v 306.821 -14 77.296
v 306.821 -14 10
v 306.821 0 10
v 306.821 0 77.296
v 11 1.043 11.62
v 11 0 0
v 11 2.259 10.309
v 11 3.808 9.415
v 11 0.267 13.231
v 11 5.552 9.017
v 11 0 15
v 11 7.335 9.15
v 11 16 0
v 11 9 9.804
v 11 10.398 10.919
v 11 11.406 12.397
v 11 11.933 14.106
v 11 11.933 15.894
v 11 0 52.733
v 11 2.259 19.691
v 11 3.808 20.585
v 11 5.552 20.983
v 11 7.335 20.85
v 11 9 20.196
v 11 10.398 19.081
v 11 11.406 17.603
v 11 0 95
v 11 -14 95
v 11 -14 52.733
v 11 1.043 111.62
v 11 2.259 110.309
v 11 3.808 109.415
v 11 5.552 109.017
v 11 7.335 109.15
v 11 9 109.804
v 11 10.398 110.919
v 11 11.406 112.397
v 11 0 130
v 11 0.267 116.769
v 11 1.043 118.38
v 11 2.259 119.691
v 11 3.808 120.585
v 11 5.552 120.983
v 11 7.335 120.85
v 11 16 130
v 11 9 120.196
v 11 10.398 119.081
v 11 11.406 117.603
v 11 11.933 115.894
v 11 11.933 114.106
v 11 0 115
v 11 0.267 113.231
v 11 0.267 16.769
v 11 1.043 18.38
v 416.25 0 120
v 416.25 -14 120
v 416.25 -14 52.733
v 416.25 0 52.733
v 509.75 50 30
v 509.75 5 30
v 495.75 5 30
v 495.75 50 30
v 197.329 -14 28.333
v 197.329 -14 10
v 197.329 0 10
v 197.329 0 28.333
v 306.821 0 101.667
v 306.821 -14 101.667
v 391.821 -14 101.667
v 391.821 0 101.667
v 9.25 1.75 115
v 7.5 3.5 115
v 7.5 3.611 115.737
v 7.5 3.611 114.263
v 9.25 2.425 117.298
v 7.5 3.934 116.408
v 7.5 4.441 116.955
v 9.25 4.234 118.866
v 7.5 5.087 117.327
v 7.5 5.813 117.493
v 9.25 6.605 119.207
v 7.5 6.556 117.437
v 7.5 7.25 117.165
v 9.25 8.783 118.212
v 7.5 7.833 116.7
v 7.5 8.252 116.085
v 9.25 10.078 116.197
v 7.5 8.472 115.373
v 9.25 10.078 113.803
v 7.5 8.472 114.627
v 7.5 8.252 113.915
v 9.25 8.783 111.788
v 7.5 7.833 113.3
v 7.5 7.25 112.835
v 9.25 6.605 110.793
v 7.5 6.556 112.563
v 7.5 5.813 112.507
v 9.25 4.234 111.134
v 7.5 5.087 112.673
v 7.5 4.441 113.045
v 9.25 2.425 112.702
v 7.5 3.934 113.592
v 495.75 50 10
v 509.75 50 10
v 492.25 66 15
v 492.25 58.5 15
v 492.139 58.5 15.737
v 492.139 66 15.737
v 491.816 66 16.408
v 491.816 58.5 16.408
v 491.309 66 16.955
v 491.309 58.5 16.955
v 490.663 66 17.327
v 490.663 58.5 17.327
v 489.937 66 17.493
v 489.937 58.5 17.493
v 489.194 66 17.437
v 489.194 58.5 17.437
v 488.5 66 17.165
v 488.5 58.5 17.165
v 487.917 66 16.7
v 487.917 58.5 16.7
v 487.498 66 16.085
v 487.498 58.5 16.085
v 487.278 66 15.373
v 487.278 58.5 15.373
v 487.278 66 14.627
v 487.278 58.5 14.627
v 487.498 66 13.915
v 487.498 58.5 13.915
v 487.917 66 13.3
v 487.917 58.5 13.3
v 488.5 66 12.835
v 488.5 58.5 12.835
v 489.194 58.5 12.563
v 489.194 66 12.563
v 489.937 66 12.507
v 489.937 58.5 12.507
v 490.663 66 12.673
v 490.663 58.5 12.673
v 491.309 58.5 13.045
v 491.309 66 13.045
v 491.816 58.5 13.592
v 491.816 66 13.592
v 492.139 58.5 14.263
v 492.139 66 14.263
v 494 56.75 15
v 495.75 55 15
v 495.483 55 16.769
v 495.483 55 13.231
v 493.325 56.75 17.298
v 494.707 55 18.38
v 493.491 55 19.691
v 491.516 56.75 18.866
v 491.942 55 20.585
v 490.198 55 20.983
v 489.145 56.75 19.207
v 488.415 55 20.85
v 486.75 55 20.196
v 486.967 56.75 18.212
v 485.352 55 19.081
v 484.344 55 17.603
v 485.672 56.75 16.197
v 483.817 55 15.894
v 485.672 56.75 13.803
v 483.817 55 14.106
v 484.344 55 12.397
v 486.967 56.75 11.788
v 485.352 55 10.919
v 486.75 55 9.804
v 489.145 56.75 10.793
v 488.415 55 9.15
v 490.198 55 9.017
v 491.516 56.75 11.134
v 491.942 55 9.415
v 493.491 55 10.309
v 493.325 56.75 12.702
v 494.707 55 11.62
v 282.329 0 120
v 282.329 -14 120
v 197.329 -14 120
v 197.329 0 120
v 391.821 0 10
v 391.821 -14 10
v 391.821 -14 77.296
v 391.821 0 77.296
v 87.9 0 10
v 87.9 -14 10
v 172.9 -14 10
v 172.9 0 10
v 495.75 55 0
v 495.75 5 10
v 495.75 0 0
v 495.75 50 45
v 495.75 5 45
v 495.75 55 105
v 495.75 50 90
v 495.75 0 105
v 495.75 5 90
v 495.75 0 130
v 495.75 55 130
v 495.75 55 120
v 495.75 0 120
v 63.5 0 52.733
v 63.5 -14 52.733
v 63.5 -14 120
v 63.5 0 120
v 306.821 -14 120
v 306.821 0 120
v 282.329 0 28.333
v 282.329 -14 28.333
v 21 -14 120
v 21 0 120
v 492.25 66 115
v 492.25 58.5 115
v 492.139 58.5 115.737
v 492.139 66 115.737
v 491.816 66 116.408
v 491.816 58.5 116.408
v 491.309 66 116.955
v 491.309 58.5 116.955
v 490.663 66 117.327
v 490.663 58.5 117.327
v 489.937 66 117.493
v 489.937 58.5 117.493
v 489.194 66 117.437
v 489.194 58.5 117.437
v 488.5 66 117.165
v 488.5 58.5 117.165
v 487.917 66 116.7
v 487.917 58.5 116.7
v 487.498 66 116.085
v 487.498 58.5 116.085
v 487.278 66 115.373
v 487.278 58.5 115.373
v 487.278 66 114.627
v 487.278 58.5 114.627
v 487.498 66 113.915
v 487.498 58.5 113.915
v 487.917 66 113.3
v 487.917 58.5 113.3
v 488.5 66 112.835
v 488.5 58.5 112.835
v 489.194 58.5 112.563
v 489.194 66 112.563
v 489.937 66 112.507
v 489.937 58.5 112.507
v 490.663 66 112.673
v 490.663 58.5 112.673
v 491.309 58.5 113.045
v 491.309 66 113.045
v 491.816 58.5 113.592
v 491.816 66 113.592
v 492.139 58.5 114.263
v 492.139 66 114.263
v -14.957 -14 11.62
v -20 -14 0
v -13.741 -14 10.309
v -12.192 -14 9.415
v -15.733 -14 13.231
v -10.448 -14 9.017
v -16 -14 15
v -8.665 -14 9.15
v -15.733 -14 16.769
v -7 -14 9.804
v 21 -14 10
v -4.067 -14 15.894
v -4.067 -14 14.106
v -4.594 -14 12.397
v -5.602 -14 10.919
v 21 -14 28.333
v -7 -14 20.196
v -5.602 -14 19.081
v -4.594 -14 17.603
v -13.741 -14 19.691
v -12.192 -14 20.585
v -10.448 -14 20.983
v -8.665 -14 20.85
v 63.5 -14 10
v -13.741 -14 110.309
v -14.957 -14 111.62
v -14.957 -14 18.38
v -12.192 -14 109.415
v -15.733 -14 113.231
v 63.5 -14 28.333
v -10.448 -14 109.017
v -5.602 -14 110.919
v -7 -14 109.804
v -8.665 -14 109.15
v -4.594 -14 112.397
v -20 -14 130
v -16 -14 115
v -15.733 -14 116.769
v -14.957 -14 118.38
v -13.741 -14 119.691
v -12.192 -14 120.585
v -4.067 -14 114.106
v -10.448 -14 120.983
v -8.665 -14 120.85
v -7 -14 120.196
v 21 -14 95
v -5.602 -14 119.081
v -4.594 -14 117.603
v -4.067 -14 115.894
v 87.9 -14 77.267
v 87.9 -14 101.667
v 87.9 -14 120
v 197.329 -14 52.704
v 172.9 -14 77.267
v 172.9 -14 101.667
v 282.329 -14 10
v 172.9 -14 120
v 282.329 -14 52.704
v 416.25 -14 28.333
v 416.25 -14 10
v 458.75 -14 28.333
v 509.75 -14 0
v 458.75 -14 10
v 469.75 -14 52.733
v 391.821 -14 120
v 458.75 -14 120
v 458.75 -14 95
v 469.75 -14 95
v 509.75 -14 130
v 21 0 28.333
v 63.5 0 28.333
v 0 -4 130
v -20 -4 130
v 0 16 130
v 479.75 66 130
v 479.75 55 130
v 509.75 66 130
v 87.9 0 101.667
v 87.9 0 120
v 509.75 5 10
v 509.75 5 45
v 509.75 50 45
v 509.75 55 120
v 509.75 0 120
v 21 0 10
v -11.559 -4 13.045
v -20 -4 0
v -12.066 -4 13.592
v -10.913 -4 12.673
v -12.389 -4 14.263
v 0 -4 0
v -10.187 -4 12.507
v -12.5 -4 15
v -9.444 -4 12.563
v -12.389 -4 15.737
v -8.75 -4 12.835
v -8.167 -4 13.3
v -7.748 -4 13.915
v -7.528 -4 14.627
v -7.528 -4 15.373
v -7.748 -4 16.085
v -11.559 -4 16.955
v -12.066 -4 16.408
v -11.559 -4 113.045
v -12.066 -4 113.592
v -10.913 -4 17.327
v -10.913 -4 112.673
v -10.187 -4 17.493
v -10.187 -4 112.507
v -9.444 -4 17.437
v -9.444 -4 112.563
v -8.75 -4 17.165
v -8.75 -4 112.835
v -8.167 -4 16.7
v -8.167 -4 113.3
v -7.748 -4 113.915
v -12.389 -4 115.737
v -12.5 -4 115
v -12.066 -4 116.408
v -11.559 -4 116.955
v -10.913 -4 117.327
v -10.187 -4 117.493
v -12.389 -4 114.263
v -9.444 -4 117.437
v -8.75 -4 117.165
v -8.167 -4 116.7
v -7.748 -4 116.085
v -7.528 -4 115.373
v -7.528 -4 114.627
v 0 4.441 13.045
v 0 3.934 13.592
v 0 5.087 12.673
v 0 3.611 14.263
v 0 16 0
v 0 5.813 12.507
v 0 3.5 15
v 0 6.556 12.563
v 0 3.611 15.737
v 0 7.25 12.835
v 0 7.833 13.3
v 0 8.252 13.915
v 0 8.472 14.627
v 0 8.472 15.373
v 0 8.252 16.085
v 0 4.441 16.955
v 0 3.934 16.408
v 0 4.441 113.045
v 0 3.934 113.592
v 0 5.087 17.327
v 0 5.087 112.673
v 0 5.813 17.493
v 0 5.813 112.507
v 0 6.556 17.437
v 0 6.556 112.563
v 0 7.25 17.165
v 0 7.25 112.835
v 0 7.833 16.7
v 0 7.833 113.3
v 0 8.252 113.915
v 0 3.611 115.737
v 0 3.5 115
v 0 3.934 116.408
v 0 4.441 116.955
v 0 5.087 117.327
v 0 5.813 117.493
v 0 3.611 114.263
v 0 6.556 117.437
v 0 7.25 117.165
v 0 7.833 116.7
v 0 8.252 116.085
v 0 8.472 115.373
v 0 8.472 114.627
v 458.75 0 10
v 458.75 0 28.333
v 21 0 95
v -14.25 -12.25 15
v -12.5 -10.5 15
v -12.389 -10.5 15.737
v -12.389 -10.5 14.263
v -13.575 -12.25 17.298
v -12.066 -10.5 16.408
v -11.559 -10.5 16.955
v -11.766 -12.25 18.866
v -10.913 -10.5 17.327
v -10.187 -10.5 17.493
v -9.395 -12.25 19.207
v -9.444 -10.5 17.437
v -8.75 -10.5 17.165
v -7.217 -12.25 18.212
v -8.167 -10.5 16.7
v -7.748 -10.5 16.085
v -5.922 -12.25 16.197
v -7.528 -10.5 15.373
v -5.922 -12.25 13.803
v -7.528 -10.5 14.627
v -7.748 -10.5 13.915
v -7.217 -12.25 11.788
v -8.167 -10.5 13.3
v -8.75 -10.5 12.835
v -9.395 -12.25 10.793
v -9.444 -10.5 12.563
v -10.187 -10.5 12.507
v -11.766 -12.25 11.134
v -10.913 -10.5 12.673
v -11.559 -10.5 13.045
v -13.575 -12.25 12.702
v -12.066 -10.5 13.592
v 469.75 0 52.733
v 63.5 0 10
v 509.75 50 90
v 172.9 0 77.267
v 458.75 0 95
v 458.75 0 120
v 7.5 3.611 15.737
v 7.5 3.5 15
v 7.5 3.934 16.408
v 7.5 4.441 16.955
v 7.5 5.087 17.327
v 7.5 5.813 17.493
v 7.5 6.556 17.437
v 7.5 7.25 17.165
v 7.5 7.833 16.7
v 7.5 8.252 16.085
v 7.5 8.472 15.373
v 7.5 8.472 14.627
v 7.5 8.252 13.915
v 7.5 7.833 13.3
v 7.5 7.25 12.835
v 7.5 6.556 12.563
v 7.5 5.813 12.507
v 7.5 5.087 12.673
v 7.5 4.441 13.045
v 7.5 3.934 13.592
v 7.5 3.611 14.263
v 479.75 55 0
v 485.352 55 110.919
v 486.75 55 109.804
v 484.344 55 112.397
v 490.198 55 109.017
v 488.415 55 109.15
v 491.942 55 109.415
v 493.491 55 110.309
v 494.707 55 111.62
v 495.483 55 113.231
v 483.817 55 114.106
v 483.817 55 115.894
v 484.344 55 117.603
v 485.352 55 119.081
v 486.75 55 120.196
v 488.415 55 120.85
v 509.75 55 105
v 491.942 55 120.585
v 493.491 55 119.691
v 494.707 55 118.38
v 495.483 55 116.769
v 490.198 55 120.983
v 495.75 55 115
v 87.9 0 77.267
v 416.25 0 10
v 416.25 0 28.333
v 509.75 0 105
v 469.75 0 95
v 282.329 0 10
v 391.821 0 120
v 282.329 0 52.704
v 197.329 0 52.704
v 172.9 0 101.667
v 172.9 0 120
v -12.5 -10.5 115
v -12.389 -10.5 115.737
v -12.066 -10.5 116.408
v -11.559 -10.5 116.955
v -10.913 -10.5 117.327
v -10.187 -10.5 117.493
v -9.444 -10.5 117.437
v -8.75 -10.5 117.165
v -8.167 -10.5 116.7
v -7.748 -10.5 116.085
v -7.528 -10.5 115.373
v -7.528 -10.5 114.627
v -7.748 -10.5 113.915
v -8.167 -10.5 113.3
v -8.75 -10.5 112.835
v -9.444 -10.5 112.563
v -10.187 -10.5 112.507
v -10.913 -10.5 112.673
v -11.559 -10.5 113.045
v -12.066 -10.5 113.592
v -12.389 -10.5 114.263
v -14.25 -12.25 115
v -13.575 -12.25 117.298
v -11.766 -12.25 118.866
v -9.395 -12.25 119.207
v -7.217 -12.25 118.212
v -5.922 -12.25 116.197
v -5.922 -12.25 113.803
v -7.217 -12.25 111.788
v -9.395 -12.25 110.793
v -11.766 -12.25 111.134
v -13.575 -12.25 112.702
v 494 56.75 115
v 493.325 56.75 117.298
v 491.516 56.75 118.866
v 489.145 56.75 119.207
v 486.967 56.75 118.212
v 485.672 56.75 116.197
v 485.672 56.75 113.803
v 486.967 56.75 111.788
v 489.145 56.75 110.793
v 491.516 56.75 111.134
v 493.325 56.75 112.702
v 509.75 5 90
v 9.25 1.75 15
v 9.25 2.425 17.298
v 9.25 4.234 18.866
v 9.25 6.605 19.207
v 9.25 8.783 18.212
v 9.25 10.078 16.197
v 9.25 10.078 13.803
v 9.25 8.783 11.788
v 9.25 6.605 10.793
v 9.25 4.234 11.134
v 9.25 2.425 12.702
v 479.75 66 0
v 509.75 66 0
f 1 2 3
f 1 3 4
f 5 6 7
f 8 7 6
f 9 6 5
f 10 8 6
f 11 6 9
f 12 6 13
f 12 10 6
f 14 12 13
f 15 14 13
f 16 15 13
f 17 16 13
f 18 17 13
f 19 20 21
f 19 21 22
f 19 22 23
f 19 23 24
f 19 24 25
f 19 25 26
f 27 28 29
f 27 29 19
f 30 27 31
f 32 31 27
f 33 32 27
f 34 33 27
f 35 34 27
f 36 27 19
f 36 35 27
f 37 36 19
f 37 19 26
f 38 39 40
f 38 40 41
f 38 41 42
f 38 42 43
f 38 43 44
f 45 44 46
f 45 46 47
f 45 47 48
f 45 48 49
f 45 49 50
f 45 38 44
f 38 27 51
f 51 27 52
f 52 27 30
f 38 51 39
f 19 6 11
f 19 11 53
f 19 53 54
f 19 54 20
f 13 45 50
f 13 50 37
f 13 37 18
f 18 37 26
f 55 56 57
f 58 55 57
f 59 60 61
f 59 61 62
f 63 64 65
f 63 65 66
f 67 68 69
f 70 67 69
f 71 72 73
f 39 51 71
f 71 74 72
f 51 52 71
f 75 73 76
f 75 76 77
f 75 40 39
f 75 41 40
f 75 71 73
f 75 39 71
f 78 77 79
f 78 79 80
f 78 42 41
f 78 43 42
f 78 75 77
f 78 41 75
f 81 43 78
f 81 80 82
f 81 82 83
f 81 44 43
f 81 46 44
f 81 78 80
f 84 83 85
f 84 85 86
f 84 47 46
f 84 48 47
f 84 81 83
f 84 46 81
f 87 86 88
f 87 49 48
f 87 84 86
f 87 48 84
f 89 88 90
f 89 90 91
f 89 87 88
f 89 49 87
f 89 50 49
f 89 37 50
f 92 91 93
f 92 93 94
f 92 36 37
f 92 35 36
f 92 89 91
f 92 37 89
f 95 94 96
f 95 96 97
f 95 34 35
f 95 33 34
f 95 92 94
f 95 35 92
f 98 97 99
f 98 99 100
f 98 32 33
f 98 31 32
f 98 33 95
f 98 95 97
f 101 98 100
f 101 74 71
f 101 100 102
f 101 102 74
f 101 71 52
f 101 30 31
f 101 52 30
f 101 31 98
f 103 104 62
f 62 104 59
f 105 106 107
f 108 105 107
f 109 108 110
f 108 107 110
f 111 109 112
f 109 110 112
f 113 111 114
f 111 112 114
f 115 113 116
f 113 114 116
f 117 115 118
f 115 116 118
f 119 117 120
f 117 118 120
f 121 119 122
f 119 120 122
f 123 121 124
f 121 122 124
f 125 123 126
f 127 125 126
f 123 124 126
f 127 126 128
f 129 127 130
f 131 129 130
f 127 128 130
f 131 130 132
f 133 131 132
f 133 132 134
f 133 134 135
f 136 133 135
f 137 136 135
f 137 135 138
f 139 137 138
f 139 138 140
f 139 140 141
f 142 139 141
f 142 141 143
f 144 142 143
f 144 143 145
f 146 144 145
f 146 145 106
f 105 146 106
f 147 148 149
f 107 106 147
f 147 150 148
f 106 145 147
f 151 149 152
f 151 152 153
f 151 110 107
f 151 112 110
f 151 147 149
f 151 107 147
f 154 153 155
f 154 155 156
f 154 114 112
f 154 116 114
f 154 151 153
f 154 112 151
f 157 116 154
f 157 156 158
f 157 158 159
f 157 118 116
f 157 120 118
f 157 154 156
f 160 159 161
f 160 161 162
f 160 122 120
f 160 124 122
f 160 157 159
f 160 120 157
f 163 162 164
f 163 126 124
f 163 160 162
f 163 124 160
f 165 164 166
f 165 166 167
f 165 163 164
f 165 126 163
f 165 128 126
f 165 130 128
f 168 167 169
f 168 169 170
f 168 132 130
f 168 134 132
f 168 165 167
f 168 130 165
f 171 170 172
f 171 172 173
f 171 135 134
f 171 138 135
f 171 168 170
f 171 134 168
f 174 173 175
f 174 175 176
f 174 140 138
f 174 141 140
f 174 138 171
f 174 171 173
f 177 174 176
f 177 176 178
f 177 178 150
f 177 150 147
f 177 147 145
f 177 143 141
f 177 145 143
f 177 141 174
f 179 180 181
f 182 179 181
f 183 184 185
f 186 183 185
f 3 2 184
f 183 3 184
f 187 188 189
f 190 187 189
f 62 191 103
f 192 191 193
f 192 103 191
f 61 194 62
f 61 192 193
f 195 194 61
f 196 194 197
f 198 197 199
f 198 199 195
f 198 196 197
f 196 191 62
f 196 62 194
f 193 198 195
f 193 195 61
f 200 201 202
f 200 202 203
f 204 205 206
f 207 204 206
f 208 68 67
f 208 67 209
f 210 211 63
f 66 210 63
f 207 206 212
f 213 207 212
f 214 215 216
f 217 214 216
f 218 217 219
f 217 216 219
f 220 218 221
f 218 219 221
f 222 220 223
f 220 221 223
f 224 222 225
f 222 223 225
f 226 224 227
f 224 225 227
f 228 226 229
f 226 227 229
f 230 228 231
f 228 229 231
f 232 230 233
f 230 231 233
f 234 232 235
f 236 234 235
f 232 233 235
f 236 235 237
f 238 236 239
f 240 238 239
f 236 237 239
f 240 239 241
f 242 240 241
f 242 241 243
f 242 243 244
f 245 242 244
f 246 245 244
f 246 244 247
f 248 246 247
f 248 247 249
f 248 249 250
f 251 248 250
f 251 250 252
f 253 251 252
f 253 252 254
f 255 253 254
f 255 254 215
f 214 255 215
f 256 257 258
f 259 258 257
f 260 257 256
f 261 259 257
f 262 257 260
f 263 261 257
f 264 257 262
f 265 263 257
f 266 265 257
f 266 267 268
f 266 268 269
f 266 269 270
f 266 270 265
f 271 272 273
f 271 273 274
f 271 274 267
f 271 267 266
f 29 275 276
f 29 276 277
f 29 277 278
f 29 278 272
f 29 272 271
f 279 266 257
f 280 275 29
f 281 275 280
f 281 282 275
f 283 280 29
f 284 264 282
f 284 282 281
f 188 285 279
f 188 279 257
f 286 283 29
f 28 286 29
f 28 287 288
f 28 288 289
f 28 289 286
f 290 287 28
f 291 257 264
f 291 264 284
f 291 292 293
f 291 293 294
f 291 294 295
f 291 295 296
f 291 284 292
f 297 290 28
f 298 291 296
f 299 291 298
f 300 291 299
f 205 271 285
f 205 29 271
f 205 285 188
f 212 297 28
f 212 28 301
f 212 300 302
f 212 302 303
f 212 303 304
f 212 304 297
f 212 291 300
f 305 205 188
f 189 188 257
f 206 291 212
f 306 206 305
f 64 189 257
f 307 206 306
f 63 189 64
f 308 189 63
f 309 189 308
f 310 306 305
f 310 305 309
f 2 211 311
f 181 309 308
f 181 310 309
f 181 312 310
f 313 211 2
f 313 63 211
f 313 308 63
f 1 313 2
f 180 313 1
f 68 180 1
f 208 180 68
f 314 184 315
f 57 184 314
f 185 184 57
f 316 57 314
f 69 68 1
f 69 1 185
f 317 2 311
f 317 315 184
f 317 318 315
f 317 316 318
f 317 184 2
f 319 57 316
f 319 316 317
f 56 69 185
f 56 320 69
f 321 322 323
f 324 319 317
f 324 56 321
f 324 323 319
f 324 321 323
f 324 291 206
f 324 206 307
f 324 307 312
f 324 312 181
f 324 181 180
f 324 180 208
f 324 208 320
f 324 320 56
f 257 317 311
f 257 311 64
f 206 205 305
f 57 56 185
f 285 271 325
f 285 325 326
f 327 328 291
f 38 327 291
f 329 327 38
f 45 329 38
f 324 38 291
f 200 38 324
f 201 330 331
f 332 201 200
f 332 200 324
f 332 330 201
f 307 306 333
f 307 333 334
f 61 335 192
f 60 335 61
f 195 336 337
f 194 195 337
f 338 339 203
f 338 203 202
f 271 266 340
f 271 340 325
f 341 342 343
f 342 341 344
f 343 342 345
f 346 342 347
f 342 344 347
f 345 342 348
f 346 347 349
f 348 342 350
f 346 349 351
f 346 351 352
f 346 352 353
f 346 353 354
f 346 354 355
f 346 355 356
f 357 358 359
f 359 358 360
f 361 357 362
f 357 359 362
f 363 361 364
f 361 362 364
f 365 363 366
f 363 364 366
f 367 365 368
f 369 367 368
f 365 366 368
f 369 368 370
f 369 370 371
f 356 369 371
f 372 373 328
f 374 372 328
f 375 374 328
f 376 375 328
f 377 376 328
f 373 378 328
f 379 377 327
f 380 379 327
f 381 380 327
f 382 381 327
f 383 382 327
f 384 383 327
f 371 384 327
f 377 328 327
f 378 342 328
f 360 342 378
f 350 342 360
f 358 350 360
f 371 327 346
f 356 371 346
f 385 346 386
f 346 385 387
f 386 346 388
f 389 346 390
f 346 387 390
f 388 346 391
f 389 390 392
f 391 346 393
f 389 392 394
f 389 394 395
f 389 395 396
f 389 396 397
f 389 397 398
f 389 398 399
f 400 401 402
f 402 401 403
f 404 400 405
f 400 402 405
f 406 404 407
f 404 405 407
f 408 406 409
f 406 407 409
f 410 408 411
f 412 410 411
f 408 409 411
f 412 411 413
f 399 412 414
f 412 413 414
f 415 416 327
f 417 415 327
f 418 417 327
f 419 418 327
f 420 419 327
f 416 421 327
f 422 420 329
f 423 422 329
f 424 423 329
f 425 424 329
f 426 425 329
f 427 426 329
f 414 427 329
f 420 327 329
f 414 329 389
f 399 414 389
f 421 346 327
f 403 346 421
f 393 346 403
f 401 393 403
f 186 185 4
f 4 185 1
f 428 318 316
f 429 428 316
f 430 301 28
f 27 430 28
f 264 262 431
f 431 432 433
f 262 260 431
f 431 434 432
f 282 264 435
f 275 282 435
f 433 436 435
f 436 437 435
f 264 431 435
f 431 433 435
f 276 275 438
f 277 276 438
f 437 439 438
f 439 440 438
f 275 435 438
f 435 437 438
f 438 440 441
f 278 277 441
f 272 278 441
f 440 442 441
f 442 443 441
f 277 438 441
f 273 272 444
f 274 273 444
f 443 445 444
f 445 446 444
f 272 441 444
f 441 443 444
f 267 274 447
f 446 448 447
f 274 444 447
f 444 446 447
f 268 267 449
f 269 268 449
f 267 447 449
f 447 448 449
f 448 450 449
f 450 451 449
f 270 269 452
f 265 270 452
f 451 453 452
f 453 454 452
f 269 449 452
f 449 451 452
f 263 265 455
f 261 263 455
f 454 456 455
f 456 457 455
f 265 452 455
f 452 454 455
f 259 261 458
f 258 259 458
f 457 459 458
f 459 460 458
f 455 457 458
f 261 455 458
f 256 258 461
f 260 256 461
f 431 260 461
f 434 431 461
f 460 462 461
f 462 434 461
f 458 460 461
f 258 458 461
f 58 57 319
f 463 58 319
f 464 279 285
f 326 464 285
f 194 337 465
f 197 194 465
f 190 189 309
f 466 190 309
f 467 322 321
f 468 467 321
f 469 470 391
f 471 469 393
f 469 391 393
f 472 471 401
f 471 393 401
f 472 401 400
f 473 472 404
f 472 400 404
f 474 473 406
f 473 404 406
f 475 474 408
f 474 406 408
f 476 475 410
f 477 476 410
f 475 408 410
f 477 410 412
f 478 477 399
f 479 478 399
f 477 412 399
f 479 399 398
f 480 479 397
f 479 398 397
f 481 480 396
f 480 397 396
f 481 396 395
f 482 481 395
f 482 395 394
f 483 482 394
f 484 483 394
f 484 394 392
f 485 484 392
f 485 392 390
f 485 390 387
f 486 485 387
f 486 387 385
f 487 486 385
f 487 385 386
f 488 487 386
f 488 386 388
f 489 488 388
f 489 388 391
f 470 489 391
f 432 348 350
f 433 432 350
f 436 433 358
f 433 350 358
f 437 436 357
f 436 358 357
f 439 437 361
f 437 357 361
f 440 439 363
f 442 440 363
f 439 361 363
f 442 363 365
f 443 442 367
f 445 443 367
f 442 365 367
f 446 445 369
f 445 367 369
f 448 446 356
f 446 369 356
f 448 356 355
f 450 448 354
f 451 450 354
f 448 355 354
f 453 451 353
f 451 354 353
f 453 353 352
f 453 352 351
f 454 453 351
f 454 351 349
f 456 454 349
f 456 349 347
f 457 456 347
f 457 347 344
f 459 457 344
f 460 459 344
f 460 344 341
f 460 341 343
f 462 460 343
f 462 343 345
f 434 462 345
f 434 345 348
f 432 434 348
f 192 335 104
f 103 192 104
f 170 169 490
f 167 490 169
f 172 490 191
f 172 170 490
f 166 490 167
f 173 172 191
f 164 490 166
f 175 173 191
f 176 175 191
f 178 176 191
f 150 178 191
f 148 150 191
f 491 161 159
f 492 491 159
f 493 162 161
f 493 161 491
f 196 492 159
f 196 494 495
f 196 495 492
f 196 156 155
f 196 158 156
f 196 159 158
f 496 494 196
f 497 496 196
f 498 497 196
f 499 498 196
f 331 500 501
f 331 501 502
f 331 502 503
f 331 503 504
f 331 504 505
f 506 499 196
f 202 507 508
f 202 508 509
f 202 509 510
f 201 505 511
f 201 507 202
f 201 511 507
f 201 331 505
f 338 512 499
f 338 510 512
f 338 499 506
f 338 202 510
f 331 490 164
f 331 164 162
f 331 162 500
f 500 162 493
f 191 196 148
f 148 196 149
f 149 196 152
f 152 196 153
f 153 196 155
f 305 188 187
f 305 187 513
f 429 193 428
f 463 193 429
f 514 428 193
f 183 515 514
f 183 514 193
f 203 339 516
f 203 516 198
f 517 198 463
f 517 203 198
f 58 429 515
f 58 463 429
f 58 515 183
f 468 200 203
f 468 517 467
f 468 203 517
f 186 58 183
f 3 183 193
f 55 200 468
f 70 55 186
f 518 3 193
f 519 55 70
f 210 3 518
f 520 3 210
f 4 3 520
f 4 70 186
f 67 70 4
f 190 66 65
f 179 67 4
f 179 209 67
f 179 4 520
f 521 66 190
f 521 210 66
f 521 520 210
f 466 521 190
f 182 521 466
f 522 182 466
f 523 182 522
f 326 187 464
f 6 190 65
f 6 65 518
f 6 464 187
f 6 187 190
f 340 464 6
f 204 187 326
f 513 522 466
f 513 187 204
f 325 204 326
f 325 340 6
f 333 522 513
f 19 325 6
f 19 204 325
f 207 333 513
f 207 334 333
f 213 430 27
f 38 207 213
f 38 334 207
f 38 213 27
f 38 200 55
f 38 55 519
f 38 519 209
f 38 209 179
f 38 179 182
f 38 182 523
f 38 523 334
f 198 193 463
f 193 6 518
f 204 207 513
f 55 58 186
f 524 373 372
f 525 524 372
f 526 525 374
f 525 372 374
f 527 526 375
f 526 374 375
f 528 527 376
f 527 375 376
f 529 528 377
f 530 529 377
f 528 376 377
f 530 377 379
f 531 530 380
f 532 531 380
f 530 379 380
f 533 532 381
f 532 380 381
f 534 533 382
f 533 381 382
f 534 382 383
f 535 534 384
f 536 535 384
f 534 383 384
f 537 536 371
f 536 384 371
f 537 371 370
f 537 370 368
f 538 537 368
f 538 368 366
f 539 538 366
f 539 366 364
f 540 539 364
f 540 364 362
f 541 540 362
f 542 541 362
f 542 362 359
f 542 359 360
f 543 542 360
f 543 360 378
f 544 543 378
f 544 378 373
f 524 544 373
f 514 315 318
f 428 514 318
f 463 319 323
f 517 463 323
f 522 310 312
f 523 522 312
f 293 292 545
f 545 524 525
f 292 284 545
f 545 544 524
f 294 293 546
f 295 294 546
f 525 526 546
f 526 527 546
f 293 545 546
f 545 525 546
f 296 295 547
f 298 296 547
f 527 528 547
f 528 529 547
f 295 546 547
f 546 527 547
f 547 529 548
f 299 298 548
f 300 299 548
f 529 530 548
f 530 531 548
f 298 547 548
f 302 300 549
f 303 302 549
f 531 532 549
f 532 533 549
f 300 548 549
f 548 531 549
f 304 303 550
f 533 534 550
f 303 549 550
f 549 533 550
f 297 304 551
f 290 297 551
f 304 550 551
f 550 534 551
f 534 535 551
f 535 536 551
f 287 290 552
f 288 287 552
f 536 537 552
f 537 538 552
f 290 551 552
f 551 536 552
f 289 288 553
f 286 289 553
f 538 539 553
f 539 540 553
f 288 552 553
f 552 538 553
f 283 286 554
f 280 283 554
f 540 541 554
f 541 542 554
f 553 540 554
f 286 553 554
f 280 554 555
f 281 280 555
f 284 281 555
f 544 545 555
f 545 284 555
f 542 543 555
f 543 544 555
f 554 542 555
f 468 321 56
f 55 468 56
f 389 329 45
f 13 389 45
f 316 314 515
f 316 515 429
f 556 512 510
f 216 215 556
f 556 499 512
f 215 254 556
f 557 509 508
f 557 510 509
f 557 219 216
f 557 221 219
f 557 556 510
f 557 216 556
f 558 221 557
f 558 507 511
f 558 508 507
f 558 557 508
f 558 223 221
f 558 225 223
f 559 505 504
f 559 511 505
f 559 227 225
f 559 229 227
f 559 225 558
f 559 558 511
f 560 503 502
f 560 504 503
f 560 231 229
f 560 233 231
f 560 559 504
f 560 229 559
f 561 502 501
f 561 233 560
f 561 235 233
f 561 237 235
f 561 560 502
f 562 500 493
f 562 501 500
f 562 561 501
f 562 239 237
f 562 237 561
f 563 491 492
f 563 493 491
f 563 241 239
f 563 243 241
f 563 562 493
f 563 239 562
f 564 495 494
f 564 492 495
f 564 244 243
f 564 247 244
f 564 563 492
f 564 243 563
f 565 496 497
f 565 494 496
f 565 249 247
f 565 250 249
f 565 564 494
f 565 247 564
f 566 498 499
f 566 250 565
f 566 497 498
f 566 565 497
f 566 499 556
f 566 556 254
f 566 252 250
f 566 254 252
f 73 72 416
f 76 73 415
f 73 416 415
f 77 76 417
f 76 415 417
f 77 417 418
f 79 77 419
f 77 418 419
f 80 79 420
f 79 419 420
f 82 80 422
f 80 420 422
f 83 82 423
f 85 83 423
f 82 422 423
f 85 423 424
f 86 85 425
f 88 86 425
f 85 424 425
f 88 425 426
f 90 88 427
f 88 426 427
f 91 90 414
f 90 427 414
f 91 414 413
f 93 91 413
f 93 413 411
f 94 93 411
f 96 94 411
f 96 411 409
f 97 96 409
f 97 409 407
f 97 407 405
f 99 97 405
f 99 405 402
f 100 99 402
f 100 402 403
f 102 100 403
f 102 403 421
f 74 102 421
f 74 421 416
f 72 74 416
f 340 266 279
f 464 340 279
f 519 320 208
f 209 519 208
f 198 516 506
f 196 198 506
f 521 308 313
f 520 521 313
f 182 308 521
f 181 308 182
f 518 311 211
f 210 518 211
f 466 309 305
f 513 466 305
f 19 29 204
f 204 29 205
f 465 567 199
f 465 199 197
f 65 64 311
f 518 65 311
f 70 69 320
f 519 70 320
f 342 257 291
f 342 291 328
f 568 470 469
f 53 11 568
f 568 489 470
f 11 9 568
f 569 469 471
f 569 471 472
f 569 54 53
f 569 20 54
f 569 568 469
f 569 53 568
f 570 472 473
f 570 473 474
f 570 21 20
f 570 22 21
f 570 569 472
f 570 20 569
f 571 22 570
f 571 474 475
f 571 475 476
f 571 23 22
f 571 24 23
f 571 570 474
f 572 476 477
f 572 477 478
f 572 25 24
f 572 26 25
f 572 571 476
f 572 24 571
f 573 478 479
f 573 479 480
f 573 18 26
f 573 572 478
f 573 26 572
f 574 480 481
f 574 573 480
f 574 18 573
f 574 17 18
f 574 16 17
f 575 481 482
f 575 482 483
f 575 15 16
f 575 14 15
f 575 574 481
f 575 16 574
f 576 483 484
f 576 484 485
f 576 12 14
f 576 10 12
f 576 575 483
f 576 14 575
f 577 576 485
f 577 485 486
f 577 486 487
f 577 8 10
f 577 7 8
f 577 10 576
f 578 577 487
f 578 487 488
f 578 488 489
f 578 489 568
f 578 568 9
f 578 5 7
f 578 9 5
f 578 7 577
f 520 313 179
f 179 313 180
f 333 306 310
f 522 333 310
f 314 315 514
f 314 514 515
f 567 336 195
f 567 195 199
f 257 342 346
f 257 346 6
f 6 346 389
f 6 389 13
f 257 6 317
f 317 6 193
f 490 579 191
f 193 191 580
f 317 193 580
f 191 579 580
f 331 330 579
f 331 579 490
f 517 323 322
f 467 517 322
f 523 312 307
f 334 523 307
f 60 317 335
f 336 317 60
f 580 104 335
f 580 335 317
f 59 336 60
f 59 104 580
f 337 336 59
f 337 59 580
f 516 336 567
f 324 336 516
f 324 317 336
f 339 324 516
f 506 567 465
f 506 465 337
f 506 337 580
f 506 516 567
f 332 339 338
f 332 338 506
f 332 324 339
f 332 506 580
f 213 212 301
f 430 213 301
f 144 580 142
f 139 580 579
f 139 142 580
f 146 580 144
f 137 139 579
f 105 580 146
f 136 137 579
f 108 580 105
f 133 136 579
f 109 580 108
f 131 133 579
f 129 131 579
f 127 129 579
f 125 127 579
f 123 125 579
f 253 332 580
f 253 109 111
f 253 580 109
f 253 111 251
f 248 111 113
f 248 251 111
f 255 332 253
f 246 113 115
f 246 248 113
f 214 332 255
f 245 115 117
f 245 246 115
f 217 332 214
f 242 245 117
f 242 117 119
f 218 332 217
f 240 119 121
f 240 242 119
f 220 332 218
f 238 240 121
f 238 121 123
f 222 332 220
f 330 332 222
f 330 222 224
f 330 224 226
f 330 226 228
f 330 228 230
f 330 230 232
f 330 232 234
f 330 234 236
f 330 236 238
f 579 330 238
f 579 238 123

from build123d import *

# Parameters (mm, degrees)
F0_W           = 479.75
F0_H           = 130
F1_DEPTH       = 14
F2_W           = 20
F2_H           = 10
F3_DEPTH       = 130
F4_W           = 11
F4_H           = 16
F5_DEPTH       = 130
F6_W           = 42.5000000004
F6_H           = 18.3330895797
F6_W_2         = 42.5
F6_H_2         = 67.2669104207
F6_H_3         = 18.3330895795
F6_W_3         = 42.4708837634
F6_H_4         = 67.2961863439
F6_W_4         = 42.5291162366
F6_H_5         = 67.2961863442
F6_W_5         = 42.4708837635
F7_DEPTH       = 25
F8_R           = 2.5
F9_DEPTH       = 25
F10_R          = 2.5
F11_DEPTH      = 11.001
F11_DEPTH_BACK = 25
F12_R          = 2.5
F13_DEPTH      = 25
F14_SIZE       = 3.49999
F15_W          = 45
F15_H          = 20
F15_W_2        = 55
F15_H_2        = 15
F15_H_3        = 45
F16_DEPTH      = 25


# Not quite as in the source:
# - a fillet or chamfer is up to 0.001 mm smaller than in the source, because OpenCascade refuses the exact size
# - a feature names something its author has since deleted; it is built from what else it names


with BuildPart() as f1:
    # F0 (on Front) → F1 (new body)
    with BuildSketch(Plane.XZ):
        with Locations((239.875, 65)):
            Rectangle(F0_W, F0_H)
    extrude(amount=F1_DEPTH)

    # F2 (on face) → F3 (join, through all)
    with BuildSketch(Plane.XY.offset(130)):
        Polygon((479.75, 0), (479.75, -14), (509.75, -14), (509.75, 66), (479.75, 66), (479.75, 55), (495.75, 55), (495.75, 0), align=None)
        with Locations((-10, -9)):
            Rectangle(F2_W, F2_H)
    extrude(amount=-F3_DEPTH)

    # F4 (on face) → F5 (join, through all)
    with BuildSketch(Plane.XY.offset(130)):
        with Locations((5.5, 8)):
            Rectangle(F4_W, F4_H)
    extrude(amount=-F5_DEPTH)

    # F6 (on face) → F7 (cut)
    with BuildSketch(Plane.XZ.offset(14)):
        Polygon((21, 120), (21, 95), (11, 95), (11, 52.7330895796), (21, 52.7330895796), (63.5, 52.7330895796), (63.5, 120), align=None)
        with Locations((42.2499999998, 19.1665447897)):
            Rectangle(F6_W, F6_H)
        with Locations((109.15, 43.6334552101)):
            Rectangle(F6_W_2, F6_H_2)
        with Locations((151.65, 43.6334552101)):
            Rectangle(F6_W_2, F6_H_2)
        with Locations((109.15, 110.8334552102)):
            Rectangle(F6_W_2, F6_H_3)
        with Locations((151.65, 110.8334552102)):
            Rectangle(F6_W_2, F6_H_3)
        with Locations((218.5645581183, 86.351906828)):
            Rectangle(F6_W_3, F6_H_4)
        with Locations((261.0645581183, 86.351906828)):
            Rectangle(F6_W_4, F6_H_4)
        with Locations((218.5645581183, 19.1665447897)):
            Rectangle(F6_W_3, F6_H)
        with Locations((261.0645581183, 19.1665447897)):
            Rectangle(F6_W_4, F6_H)
        with Locations((328.0854418817, 43.6480931718)):
            Rectangle(F6_W_4, F6_H_5)
        with Locations((370.5854418817, 43.6480931718)):
            Rectangle(F6_W_5, F6_H_5)
        with Locations((370.5854418817, 110.8334552102)):
            Rectangle(F6_W_3, F6_H_3)
        with Locations((328.0854418817, 110.8334552102)):
            Rectangle(F6_W_4, F6_H_3)
        Polygon((458.75, 120), (416.25, 120), (416.25, 52.7330895795), (469.75, 52.7330895795), (469.75, 95), (458.75, 95), align=None)
        with Locations((437.5, 19.1665447897)):
            Rectangle(F6_W_2, F6_H)
    extrude(amount=-F7_DEPTH, mode=Mode.SUBTRACT)

    # F8 (on face) → F9 (cut)
    with BuildSketch(Plane(origin=(0, -4, 0), x_dir=(-1, 0, 0), z_dir=(0, 1, 0))):
        with Locations((10, 115)):
            Circle(F8_R)
        with Locations((10, 15)):
            Circle(F8_R)
    extrude(amount=-F9_DEPTH, mode=Mode.SUBTRACT)

    # F10 (on face) → F11 (cut, two sides)
    with BuildSketch(Plane.XZ.offset(-55)) as f11_sk:
        with Locations((489.75, 15)):
            Circle(F10_R)
        with Locations((489.75, 115)):
            Circle(F10_R)
    extrude(amount=-F11_DEPTH, mode=Mode.SUBTRACT)
    extrude(f11_sk.sketch, amount=F11_DEPTH_BACK, mode=Mode.SUBTRACT)

    # F12 (on face) → F13 (cut)
    with BuildSketch(Plane(origin=(0, 0, 0), x_dir=(0, -1, 0), z_dir=(-1, 0, 0))):
        with Locations((-6, 15)):
            Circle(F12_R)
        with Locations((-6, 115)):
            Circle(F12_R)
    extrude(amount=-F13_DEPTH, mode=Mode.SUBTRACT)

    # F14 (size 3.5 in the source; OpenCascade refuses exactly that, so slightly less here)
    f14_edges = [f1.edges().sort_by_distance(p)[0] for p in [
        (487.25, 55, 15),
        (487.25, 55, 115),
        (-7.5, -14, 15),
        (-7.5, -14, 115),
        (11, 8.5, 15),
        (11, 8.5, 115),
    ]]
    chamfer(f14_edges, length=F14_SIZE)

    # F15 (on face) → F16 (cut)
    with BuildSketch(Plane.YZ.offset(509.75)):
        with Locations((27.5, 20)):
            Rectangle(F15_W, F15_H)
        with Locations((27.5, 112.5)):
            Rectangle(F15_W_2, F15_H_2)
        with Locations((27.5, 67.5)):
            Rectangle(F15_W, F15_H_3)
    extrude(amount=-F16_DEPTH, mode=Mode.SUBTRACT)


solid = f1.part
